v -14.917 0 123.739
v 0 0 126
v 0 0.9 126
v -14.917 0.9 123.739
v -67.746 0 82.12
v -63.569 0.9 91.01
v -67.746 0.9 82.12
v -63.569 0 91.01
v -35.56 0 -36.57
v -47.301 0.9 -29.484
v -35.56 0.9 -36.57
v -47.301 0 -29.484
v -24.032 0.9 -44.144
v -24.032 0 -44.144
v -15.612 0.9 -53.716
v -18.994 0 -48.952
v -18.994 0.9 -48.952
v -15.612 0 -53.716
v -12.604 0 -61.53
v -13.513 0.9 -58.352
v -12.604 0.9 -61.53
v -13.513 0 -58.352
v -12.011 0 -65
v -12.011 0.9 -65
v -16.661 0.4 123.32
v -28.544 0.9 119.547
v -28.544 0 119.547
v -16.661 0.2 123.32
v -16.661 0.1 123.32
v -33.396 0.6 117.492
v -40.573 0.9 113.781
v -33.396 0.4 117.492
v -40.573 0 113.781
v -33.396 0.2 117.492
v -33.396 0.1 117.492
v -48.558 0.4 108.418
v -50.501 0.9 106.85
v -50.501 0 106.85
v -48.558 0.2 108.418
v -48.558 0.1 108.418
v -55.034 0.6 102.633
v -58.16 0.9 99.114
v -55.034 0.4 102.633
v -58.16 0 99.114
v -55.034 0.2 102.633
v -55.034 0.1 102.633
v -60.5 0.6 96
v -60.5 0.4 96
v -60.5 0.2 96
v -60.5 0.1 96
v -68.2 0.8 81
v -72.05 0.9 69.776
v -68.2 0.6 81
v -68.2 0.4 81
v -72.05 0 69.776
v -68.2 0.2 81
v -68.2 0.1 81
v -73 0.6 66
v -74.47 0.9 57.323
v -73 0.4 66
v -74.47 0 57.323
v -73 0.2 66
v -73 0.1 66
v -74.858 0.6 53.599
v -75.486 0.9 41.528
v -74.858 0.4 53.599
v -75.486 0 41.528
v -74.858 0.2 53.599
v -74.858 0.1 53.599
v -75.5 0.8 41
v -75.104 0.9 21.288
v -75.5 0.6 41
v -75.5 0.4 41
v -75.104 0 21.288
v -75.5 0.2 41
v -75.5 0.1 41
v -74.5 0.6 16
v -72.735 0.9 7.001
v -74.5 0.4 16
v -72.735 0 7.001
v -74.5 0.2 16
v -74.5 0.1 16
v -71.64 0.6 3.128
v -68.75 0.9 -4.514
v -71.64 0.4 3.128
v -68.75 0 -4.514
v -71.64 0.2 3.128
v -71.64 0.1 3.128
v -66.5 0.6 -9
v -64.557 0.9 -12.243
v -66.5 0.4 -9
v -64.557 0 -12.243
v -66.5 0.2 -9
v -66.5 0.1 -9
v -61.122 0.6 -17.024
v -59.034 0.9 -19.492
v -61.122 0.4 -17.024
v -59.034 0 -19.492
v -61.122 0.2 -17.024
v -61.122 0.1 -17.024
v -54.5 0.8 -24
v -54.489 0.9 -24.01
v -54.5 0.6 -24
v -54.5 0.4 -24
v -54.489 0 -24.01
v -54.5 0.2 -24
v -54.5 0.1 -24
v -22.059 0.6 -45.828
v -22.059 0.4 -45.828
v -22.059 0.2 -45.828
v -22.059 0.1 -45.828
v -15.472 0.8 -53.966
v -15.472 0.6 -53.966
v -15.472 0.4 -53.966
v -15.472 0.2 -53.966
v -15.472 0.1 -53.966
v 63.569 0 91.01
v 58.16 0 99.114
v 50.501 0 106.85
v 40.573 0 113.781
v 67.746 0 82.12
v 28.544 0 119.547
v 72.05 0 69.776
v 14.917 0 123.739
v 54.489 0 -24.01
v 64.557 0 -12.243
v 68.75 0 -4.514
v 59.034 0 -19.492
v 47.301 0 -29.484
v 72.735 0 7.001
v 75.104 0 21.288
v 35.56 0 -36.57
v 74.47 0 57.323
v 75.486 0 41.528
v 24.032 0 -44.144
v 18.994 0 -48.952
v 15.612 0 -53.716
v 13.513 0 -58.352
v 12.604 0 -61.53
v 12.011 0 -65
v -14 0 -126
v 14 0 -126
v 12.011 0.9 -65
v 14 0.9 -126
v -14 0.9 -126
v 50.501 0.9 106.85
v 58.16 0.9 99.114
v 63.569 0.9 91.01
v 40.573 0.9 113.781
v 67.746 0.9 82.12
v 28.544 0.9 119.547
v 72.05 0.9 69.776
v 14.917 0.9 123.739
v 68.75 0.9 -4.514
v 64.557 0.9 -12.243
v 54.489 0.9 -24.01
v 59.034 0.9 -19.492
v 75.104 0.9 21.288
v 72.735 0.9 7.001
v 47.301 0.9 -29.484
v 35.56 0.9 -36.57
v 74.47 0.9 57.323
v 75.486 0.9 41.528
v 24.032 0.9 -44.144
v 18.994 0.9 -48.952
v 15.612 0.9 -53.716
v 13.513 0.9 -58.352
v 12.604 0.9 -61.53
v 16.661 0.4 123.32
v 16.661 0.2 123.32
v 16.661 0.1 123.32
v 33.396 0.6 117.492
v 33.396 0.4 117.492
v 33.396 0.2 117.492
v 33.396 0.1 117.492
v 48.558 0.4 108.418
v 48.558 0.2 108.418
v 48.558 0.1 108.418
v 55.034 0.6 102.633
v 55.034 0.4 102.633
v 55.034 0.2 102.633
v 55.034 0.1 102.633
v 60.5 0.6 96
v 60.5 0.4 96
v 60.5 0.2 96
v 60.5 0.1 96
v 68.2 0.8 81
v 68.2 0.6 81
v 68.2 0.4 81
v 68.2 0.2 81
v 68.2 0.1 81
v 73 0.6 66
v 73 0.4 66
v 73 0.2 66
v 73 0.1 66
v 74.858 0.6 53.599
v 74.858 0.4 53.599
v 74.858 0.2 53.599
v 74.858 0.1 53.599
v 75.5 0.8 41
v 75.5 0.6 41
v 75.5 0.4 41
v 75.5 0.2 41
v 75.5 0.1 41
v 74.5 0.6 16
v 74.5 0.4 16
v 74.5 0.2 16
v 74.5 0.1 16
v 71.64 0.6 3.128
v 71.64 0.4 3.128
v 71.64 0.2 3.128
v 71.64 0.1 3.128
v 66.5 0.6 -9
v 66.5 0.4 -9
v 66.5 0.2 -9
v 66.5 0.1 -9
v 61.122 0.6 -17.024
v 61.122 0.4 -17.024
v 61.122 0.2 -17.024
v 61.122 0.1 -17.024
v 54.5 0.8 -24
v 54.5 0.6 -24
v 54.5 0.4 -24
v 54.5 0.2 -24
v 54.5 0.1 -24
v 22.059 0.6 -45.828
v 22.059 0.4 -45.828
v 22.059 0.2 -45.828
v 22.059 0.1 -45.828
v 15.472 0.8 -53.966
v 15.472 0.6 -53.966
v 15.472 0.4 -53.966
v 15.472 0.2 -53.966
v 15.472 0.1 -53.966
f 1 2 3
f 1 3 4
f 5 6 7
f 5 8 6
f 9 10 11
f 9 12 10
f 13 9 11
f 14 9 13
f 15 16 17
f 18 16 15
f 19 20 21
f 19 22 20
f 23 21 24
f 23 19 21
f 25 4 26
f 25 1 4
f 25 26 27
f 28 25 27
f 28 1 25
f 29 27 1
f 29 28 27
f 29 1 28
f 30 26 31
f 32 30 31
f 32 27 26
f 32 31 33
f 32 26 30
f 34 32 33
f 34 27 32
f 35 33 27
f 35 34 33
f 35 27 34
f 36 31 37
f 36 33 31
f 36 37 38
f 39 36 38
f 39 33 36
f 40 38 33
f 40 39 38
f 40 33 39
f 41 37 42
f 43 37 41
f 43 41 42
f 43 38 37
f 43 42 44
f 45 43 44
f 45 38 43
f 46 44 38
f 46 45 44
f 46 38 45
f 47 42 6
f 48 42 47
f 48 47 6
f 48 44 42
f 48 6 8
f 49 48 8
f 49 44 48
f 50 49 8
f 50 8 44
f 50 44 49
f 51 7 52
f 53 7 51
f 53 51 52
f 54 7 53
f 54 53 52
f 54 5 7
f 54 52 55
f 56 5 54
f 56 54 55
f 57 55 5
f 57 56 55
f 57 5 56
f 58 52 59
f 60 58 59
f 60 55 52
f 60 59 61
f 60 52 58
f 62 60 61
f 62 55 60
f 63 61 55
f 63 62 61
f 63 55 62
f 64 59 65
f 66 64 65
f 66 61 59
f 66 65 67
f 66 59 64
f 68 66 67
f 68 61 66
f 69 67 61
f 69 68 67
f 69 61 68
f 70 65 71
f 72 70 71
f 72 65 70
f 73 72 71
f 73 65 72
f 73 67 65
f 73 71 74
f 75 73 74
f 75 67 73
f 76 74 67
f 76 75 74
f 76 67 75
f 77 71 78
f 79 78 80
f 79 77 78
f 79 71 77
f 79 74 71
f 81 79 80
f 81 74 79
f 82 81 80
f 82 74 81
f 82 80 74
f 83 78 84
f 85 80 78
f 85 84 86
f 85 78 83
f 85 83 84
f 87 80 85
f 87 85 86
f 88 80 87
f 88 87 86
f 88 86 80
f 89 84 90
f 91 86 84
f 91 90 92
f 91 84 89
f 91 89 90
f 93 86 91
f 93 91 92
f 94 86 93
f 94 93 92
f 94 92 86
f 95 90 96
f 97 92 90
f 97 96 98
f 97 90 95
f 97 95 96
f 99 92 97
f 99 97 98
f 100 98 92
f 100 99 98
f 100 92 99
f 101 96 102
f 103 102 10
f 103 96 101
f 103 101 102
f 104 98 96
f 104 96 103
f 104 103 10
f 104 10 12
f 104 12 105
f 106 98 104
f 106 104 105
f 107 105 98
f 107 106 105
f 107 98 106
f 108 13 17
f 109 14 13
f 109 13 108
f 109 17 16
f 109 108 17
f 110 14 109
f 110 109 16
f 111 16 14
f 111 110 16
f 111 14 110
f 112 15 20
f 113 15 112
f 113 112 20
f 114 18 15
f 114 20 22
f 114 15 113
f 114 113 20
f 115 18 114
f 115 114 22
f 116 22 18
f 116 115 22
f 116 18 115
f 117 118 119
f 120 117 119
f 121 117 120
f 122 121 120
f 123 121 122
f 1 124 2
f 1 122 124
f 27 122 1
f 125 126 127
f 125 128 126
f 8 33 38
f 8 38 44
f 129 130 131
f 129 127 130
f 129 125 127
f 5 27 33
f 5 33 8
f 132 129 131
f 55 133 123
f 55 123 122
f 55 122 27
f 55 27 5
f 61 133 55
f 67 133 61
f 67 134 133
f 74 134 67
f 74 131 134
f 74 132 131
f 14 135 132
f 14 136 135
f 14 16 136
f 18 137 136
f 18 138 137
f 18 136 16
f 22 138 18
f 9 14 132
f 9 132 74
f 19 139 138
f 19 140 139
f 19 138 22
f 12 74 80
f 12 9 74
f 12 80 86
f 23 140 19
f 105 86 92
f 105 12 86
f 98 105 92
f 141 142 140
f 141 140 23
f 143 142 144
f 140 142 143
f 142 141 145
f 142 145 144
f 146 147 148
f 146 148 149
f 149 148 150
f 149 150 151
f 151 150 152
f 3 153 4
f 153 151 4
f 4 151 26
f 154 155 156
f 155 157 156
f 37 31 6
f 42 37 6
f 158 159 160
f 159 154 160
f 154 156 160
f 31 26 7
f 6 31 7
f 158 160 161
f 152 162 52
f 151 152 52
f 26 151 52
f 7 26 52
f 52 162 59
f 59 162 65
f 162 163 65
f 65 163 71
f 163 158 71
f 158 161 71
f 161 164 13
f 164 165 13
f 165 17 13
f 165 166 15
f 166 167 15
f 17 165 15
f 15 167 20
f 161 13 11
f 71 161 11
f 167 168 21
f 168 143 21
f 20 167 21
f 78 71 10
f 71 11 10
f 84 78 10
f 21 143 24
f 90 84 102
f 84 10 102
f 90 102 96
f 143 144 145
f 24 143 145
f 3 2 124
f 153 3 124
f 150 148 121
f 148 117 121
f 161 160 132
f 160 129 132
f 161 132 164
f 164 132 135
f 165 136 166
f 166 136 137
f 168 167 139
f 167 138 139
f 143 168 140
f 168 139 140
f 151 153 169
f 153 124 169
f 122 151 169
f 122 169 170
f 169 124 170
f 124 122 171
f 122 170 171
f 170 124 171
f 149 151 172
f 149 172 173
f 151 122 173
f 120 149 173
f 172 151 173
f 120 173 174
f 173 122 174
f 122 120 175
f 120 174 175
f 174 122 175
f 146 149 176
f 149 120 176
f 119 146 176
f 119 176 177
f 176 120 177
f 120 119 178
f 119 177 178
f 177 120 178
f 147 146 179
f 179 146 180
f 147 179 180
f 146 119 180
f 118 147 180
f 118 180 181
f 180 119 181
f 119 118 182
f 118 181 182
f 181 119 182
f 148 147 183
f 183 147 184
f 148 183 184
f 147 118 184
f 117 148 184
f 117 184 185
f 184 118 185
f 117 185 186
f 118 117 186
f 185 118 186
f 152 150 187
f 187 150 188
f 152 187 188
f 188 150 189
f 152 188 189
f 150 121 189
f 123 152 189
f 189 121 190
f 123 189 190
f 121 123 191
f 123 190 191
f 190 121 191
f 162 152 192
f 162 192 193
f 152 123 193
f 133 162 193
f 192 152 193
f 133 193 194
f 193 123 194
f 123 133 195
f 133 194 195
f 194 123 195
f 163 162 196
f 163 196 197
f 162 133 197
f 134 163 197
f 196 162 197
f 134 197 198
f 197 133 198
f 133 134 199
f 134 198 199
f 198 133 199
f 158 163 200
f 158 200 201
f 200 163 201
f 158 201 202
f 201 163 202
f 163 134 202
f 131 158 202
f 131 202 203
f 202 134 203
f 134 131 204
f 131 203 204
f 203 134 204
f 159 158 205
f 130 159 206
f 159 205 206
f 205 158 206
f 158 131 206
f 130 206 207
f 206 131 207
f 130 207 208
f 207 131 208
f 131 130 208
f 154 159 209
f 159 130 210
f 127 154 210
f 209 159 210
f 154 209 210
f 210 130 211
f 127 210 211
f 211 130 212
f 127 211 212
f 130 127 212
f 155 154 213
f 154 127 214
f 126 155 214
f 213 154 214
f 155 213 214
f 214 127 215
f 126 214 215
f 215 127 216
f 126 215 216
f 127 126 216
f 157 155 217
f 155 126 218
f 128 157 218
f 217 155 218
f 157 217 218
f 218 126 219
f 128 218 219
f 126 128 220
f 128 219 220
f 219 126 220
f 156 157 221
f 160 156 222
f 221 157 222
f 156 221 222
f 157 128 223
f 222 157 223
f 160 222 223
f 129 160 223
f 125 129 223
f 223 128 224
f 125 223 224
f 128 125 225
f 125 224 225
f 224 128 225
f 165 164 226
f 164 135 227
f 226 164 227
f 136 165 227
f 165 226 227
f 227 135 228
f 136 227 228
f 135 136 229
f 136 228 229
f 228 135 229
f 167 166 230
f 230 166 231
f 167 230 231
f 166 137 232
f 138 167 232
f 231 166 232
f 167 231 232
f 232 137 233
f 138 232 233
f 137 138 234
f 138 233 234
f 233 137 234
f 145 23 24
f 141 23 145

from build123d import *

# Parameters (mm, degrees)
BOSS_EXTRUDE1_DEPTH = 0.9


with BuildPart() as part:
    # Sketch1 → Boss-Extrude1 (new body)
    with BuildSketch(Plane(origin=(0, 0, 0), x_dir=(1, 0, 0), z_dir=(0, 1, 0))):
        with BuildLine():
            Line((-14, 126), (14, 126))
            Line((14, 126), (12.010869565, 65))
            add(Edge.make_bspline(
                [(0, -126), (21.433619385, -124.481891069), (53.814336013, -112.472945485), (68.353116066, -81.439281394), (74.54638909, -63.145782756), (75.743897619, -41.002981951), (75.640582841, -15.527359986), (68.952122949, 7.612822047), (55.542429665, 24.475938434), (32.950199531, 38.640758932), (14.028578126, 47.884779804), (12.010869565, 65)],
                knots=[0, 0, 0, 0, 0.267560962, 0.332938778, 0.394006326, 0.491426816, 0.588441347, 0.690220593, 0.76470456, 0.833002171, 1, 1, 1, 1], degree=3))
            add(Edge.make_bspline(
                [(0, -126), (-21.433619385, -124.481891069), (-53.814336013, -112.472945485), (-68.353116066, -81.439281394), (-74.54638909, -63.145782756), (-75.743897619, -41.002981951), (-75.640582841, -15.527359986), (-68.952122949, 7.612822047), (-55.542429665, 24.475938434), (-32.950199531, 38.640758932), (-14.028578126, 47.884779804), (-12.010869565, 65)],
                knots=[0, 0, 0, 0, 0.267560962, 0.332938778, 0.394006326, 0.491426816, 0.588441347, 0.690220593, 0.76470456, 0.833002171, 1, 1, 1, 1], degree=3))
            Line((-12.010869565, 65), (-14, 126))
        make_face()
    extrude(amount=BOSS_EXTRUDE1_DEPTH)


solid = part.part
